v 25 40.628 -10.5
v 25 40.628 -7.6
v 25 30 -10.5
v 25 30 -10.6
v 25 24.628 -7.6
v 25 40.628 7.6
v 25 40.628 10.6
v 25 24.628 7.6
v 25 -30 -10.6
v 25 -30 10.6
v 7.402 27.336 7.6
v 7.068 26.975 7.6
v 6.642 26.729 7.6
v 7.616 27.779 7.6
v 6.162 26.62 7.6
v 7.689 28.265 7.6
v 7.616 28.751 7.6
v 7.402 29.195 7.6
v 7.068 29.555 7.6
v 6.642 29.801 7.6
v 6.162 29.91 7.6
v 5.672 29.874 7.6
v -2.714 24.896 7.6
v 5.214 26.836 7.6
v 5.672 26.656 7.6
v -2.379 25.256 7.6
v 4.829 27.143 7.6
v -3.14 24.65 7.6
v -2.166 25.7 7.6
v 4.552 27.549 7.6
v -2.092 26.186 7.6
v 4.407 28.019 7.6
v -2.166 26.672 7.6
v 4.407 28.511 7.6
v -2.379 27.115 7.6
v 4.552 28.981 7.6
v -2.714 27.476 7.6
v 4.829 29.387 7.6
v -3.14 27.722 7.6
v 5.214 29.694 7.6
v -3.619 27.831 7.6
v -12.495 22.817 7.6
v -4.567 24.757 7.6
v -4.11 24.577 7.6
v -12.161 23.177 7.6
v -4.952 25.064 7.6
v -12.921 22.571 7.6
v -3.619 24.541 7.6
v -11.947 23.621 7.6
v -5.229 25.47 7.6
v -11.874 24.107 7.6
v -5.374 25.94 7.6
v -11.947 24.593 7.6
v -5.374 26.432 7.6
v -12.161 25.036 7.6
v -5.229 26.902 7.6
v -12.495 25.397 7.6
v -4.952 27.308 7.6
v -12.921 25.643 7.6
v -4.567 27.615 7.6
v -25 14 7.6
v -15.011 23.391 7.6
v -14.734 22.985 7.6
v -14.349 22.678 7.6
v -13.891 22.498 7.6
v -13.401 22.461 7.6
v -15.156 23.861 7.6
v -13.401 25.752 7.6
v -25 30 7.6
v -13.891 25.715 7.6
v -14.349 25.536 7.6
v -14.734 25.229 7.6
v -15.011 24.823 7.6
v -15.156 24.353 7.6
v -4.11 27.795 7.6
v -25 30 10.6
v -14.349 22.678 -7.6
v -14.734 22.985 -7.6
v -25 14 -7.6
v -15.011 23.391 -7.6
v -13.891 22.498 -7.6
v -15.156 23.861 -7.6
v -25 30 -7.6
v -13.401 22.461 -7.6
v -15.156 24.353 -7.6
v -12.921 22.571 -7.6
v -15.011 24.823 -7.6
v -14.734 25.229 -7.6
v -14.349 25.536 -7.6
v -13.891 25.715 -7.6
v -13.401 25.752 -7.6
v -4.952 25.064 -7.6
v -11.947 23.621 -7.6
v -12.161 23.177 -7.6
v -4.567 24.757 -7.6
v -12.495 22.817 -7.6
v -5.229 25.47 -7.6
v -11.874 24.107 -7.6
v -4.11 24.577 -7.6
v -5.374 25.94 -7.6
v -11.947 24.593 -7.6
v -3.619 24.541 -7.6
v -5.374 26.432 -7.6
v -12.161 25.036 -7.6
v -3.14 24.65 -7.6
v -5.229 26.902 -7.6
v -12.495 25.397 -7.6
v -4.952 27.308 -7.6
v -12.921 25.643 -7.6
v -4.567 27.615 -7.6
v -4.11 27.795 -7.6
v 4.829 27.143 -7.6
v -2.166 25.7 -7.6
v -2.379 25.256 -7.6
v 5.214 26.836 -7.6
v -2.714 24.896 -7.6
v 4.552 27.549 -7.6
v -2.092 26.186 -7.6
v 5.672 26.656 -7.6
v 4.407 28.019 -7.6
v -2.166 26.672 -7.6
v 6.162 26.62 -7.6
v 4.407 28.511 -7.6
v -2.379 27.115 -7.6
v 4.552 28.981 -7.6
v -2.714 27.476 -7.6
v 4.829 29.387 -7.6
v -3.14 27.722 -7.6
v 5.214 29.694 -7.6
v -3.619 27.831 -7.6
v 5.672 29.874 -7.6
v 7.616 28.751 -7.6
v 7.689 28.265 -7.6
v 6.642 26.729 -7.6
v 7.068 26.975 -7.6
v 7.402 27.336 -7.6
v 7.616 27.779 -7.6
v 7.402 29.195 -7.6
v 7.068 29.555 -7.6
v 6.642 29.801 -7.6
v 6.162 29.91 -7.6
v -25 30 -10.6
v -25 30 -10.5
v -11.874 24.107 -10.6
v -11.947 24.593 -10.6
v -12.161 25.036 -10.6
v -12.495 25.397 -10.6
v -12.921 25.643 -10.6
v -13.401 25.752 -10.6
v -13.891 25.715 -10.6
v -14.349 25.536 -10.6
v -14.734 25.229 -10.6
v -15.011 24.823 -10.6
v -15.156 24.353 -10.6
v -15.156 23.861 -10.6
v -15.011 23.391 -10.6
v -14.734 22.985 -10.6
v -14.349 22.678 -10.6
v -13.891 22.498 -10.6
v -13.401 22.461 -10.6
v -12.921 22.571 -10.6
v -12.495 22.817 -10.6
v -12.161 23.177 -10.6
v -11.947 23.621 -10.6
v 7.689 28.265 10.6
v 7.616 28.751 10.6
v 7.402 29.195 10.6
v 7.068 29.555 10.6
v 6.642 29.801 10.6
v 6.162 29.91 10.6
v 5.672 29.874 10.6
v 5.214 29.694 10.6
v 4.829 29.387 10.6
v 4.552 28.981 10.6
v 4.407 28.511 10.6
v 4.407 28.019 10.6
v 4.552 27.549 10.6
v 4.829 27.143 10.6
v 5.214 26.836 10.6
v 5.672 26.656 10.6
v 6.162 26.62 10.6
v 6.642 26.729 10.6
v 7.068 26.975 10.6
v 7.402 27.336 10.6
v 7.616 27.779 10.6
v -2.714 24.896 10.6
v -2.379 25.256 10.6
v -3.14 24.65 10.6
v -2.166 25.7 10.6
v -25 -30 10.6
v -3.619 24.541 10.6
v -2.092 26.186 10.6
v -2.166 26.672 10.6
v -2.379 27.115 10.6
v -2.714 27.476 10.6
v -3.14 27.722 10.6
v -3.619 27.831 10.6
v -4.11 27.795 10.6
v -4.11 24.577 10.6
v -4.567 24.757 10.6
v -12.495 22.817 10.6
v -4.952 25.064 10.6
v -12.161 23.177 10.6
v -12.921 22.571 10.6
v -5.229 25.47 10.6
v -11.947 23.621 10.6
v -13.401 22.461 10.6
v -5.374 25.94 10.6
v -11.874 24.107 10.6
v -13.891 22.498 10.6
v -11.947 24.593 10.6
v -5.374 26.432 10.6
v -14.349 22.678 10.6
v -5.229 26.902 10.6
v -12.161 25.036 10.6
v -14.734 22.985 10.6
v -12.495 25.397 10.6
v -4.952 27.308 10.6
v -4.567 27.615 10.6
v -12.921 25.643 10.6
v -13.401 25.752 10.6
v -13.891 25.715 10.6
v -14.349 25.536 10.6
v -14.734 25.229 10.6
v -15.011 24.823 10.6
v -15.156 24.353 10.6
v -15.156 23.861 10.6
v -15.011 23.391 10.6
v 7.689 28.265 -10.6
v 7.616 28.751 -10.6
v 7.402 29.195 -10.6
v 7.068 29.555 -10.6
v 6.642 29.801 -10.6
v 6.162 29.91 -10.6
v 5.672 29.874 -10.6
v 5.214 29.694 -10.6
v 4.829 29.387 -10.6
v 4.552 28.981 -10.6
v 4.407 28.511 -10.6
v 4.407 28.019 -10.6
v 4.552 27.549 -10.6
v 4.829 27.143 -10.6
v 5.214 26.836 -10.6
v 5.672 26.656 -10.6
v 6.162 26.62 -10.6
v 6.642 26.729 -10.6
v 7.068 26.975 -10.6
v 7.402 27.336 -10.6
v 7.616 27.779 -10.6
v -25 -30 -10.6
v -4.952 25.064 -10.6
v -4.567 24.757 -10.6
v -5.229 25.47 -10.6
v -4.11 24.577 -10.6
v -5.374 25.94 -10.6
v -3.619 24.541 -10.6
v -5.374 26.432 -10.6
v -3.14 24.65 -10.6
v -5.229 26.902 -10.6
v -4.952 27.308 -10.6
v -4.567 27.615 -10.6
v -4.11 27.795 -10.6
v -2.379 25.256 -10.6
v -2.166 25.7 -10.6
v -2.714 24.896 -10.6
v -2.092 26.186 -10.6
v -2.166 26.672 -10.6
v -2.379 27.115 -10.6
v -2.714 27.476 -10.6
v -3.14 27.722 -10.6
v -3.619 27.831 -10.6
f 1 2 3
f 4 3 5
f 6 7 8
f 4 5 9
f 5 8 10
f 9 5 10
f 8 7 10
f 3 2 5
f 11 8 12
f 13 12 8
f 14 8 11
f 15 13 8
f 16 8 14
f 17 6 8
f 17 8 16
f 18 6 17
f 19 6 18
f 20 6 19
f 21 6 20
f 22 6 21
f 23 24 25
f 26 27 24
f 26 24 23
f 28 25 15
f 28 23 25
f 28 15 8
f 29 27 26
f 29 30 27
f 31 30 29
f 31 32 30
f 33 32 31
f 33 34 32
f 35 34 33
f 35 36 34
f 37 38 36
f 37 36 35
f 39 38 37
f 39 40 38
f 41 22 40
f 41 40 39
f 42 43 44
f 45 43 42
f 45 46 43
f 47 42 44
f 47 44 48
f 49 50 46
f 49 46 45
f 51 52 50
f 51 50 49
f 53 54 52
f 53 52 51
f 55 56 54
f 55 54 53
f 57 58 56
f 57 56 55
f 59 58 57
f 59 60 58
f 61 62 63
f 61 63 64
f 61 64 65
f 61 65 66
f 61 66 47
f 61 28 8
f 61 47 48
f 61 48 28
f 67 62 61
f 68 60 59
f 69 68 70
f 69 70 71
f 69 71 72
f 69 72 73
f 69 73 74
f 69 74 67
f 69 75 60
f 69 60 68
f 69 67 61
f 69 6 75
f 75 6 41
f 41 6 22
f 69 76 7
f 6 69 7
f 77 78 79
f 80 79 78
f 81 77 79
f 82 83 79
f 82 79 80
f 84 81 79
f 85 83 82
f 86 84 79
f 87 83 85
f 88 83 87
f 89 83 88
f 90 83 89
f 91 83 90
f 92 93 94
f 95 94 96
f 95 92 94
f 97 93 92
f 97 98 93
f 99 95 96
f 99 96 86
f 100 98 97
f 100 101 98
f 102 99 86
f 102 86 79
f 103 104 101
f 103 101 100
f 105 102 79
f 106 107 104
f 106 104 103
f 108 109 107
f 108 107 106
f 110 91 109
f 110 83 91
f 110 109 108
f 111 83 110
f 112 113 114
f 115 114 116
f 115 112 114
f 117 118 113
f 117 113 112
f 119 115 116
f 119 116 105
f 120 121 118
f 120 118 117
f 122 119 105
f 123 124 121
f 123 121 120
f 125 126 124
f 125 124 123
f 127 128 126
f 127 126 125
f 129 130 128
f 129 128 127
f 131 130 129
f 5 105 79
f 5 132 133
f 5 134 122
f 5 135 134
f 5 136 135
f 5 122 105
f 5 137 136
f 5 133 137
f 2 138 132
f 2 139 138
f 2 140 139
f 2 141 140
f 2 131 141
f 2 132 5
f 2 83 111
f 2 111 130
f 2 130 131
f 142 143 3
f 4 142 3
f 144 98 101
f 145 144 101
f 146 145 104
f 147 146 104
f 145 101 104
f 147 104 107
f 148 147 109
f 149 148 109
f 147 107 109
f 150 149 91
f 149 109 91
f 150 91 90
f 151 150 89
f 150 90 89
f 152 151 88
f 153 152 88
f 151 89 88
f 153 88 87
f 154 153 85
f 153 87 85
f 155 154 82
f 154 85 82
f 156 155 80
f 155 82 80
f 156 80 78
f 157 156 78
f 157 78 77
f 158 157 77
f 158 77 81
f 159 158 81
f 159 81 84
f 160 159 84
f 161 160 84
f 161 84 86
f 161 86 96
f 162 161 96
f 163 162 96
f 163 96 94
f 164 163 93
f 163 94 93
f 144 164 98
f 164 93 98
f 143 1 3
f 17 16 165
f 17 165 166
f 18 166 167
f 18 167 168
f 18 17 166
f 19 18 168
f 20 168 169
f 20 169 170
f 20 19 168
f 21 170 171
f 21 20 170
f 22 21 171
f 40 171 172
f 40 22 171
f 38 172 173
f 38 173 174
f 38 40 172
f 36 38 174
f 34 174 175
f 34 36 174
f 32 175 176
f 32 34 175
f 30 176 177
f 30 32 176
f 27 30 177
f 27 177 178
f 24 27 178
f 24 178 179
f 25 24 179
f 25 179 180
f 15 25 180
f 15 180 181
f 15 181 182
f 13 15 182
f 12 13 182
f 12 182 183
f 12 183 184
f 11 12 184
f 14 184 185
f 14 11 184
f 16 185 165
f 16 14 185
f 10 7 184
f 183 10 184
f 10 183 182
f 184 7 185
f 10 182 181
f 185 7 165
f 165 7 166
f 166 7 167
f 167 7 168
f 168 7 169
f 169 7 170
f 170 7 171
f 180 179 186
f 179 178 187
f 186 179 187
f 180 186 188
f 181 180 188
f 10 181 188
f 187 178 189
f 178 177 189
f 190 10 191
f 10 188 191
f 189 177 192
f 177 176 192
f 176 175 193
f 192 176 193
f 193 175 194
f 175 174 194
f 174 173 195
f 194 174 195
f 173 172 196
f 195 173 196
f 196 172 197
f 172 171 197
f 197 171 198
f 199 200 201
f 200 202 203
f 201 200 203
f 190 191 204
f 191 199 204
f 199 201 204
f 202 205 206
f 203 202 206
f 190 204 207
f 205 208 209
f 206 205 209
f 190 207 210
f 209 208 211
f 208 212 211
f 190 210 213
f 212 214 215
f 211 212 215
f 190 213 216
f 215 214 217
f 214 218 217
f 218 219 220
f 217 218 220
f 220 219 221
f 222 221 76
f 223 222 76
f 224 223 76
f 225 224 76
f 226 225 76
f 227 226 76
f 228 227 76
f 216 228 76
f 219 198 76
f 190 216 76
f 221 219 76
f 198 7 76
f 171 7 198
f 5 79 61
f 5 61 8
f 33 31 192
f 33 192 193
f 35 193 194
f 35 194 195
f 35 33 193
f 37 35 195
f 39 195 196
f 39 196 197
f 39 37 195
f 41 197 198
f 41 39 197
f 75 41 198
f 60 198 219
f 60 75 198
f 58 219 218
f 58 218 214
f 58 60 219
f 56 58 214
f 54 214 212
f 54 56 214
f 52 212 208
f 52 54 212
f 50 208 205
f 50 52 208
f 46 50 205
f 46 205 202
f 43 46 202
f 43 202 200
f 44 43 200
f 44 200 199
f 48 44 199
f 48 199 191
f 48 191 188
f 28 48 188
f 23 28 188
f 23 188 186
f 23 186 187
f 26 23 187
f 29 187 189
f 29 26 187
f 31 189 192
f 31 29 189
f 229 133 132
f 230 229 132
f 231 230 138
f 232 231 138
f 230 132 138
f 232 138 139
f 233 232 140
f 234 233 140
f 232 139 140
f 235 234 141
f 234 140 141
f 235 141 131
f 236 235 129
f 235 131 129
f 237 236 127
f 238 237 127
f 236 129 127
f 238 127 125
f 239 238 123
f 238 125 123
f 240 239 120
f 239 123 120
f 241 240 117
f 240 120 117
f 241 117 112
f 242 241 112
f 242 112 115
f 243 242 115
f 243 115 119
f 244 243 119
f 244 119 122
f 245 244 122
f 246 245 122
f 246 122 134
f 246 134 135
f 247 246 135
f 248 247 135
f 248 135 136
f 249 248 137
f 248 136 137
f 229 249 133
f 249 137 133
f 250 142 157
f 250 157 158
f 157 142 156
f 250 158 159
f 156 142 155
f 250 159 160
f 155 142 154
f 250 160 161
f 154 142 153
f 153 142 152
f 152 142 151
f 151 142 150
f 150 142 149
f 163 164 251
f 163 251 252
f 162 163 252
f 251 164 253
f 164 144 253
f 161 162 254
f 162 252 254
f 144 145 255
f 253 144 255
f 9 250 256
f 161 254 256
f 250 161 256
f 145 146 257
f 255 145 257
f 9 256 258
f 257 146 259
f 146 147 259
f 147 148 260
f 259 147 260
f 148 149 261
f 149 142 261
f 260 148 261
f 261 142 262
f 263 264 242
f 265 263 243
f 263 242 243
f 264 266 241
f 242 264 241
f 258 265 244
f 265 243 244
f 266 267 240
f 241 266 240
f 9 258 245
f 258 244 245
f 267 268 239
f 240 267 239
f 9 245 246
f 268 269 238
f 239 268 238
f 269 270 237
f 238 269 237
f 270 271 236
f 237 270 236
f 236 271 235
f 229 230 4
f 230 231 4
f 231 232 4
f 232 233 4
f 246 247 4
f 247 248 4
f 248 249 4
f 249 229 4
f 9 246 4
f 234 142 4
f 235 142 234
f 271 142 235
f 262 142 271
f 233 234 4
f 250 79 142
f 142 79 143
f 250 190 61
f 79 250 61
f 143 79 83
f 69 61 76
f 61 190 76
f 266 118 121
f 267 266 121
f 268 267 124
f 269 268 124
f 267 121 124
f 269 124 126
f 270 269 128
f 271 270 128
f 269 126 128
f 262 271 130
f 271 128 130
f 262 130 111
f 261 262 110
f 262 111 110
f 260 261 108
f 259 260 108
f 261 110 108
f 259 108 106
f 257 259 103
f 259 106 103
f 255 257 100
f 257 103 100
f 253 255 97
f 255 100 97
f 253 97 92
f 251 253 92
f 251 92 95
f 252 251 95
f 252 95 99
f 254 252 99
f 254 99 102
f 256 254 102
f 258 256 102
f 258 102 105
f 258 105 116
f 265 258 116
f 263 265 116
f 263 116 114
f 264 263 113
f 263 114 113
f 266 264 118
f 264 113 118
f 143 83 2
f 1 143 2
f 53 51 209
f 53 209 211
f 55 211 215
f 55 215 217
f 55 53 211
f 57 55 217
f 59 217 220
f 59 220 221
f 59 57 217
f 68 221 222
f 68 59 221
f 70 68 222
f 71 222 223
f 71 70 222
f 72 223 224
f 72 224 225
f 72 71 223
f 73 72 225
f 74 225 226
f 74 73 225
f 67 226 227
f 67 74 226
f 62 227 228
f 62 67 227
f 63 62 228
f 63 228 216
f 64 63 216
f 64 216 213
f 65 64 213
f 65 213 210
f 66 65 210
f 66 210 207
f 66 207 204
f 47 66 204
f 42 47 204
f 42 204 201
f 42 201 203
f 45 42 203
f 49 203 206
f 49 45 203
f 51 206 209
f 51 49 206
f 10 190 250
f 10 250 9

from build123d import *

# Parameters (mm, degrees)
SKETCH_1_W          = 50
SKETCH_1_H          = 60
EXTRUDE_1_DEPTH     = 10.6
EXTRUDE_2_DEPTH     = 3
EXTRUDE_START       = -18.1
EXTRUDE_3_DEPTH     = 3
SKETCH_3_W          = 15.2
SKETCH_3_H          = 16
SKETCH_4_R          = 1.65
CUT_EXTRUDE_1_DEPTH = 3


with BuildPart() as part:
    # 草图1 → 凸台-拉伸1 (new, symmetric)
    with BuildSketch(Plane.XY):
        Rectangle(SKETCH_1_W, SKETCH_1_H)
    extrude(amount=EXTRUDE_1_DEPTH, both=True)

    # 草图2 → 凸台-拉伸2 (add)
    with BuildSketch(Plane.XY.offset(10.6)):
        Polygon((-25, 30), (25, 40.627828084), (25, 30), align=None)
    extrude(amount=-EXTRUDE_2_DEPTH)

    # 草图2<2> → 凸台-拉伸3 (add)
    with BuildSketch(Plane.XY.offset(10.6).offset(EXTRUDE_START)):
        Polygon((-25, 30), (25, 40.627828084), (25, 30), align=None)
    extrude(amount=-EXTRUDE_3_DEPTH)

    # 切除-扫描1: sweep along a curve in space
    with BuildLine() as sweep_1_path:
        Line((25, 40.627828084, 10.6), (-25, 30, 10.6))
    # 草图3 → 切除-扫描1 (sweep, cut)
    with BuildSketch(Plane.ZY.offset(25)):
        with Locations((0, 22)):
            Rectangle(SKETCH_3_W, SKETCH_3_H)
    sweep(path=sweep_1_path.line, mode=Mode.SUBTRACT)

    # 草图4 → 切除-拉伸1 (cut)
    with BuildSketch(Plane.XY.offset(-7.6)):
        with Locations((-13.523968529, 24.106860253)):
            Circle(SKETCH_4_R)
        with Locations((-3.742492522, 26.185977161)):
            Circle(SKETCH_4_R)
        with Locations((6.038983485, 28.265094069)):
            Circle(SKETCH_4_R)
    cut_extrude_1 = extrude(amount=-CUT_EXTRUDE_1_DEPTH, mode=Mode.SUBTRACT)

    # 镜向1: 切除-拉伸1 across plane
    add(cut_extrude_1.mirror(Plane.XY), mode=Mode.SUBTRACT)


solid = part.part
